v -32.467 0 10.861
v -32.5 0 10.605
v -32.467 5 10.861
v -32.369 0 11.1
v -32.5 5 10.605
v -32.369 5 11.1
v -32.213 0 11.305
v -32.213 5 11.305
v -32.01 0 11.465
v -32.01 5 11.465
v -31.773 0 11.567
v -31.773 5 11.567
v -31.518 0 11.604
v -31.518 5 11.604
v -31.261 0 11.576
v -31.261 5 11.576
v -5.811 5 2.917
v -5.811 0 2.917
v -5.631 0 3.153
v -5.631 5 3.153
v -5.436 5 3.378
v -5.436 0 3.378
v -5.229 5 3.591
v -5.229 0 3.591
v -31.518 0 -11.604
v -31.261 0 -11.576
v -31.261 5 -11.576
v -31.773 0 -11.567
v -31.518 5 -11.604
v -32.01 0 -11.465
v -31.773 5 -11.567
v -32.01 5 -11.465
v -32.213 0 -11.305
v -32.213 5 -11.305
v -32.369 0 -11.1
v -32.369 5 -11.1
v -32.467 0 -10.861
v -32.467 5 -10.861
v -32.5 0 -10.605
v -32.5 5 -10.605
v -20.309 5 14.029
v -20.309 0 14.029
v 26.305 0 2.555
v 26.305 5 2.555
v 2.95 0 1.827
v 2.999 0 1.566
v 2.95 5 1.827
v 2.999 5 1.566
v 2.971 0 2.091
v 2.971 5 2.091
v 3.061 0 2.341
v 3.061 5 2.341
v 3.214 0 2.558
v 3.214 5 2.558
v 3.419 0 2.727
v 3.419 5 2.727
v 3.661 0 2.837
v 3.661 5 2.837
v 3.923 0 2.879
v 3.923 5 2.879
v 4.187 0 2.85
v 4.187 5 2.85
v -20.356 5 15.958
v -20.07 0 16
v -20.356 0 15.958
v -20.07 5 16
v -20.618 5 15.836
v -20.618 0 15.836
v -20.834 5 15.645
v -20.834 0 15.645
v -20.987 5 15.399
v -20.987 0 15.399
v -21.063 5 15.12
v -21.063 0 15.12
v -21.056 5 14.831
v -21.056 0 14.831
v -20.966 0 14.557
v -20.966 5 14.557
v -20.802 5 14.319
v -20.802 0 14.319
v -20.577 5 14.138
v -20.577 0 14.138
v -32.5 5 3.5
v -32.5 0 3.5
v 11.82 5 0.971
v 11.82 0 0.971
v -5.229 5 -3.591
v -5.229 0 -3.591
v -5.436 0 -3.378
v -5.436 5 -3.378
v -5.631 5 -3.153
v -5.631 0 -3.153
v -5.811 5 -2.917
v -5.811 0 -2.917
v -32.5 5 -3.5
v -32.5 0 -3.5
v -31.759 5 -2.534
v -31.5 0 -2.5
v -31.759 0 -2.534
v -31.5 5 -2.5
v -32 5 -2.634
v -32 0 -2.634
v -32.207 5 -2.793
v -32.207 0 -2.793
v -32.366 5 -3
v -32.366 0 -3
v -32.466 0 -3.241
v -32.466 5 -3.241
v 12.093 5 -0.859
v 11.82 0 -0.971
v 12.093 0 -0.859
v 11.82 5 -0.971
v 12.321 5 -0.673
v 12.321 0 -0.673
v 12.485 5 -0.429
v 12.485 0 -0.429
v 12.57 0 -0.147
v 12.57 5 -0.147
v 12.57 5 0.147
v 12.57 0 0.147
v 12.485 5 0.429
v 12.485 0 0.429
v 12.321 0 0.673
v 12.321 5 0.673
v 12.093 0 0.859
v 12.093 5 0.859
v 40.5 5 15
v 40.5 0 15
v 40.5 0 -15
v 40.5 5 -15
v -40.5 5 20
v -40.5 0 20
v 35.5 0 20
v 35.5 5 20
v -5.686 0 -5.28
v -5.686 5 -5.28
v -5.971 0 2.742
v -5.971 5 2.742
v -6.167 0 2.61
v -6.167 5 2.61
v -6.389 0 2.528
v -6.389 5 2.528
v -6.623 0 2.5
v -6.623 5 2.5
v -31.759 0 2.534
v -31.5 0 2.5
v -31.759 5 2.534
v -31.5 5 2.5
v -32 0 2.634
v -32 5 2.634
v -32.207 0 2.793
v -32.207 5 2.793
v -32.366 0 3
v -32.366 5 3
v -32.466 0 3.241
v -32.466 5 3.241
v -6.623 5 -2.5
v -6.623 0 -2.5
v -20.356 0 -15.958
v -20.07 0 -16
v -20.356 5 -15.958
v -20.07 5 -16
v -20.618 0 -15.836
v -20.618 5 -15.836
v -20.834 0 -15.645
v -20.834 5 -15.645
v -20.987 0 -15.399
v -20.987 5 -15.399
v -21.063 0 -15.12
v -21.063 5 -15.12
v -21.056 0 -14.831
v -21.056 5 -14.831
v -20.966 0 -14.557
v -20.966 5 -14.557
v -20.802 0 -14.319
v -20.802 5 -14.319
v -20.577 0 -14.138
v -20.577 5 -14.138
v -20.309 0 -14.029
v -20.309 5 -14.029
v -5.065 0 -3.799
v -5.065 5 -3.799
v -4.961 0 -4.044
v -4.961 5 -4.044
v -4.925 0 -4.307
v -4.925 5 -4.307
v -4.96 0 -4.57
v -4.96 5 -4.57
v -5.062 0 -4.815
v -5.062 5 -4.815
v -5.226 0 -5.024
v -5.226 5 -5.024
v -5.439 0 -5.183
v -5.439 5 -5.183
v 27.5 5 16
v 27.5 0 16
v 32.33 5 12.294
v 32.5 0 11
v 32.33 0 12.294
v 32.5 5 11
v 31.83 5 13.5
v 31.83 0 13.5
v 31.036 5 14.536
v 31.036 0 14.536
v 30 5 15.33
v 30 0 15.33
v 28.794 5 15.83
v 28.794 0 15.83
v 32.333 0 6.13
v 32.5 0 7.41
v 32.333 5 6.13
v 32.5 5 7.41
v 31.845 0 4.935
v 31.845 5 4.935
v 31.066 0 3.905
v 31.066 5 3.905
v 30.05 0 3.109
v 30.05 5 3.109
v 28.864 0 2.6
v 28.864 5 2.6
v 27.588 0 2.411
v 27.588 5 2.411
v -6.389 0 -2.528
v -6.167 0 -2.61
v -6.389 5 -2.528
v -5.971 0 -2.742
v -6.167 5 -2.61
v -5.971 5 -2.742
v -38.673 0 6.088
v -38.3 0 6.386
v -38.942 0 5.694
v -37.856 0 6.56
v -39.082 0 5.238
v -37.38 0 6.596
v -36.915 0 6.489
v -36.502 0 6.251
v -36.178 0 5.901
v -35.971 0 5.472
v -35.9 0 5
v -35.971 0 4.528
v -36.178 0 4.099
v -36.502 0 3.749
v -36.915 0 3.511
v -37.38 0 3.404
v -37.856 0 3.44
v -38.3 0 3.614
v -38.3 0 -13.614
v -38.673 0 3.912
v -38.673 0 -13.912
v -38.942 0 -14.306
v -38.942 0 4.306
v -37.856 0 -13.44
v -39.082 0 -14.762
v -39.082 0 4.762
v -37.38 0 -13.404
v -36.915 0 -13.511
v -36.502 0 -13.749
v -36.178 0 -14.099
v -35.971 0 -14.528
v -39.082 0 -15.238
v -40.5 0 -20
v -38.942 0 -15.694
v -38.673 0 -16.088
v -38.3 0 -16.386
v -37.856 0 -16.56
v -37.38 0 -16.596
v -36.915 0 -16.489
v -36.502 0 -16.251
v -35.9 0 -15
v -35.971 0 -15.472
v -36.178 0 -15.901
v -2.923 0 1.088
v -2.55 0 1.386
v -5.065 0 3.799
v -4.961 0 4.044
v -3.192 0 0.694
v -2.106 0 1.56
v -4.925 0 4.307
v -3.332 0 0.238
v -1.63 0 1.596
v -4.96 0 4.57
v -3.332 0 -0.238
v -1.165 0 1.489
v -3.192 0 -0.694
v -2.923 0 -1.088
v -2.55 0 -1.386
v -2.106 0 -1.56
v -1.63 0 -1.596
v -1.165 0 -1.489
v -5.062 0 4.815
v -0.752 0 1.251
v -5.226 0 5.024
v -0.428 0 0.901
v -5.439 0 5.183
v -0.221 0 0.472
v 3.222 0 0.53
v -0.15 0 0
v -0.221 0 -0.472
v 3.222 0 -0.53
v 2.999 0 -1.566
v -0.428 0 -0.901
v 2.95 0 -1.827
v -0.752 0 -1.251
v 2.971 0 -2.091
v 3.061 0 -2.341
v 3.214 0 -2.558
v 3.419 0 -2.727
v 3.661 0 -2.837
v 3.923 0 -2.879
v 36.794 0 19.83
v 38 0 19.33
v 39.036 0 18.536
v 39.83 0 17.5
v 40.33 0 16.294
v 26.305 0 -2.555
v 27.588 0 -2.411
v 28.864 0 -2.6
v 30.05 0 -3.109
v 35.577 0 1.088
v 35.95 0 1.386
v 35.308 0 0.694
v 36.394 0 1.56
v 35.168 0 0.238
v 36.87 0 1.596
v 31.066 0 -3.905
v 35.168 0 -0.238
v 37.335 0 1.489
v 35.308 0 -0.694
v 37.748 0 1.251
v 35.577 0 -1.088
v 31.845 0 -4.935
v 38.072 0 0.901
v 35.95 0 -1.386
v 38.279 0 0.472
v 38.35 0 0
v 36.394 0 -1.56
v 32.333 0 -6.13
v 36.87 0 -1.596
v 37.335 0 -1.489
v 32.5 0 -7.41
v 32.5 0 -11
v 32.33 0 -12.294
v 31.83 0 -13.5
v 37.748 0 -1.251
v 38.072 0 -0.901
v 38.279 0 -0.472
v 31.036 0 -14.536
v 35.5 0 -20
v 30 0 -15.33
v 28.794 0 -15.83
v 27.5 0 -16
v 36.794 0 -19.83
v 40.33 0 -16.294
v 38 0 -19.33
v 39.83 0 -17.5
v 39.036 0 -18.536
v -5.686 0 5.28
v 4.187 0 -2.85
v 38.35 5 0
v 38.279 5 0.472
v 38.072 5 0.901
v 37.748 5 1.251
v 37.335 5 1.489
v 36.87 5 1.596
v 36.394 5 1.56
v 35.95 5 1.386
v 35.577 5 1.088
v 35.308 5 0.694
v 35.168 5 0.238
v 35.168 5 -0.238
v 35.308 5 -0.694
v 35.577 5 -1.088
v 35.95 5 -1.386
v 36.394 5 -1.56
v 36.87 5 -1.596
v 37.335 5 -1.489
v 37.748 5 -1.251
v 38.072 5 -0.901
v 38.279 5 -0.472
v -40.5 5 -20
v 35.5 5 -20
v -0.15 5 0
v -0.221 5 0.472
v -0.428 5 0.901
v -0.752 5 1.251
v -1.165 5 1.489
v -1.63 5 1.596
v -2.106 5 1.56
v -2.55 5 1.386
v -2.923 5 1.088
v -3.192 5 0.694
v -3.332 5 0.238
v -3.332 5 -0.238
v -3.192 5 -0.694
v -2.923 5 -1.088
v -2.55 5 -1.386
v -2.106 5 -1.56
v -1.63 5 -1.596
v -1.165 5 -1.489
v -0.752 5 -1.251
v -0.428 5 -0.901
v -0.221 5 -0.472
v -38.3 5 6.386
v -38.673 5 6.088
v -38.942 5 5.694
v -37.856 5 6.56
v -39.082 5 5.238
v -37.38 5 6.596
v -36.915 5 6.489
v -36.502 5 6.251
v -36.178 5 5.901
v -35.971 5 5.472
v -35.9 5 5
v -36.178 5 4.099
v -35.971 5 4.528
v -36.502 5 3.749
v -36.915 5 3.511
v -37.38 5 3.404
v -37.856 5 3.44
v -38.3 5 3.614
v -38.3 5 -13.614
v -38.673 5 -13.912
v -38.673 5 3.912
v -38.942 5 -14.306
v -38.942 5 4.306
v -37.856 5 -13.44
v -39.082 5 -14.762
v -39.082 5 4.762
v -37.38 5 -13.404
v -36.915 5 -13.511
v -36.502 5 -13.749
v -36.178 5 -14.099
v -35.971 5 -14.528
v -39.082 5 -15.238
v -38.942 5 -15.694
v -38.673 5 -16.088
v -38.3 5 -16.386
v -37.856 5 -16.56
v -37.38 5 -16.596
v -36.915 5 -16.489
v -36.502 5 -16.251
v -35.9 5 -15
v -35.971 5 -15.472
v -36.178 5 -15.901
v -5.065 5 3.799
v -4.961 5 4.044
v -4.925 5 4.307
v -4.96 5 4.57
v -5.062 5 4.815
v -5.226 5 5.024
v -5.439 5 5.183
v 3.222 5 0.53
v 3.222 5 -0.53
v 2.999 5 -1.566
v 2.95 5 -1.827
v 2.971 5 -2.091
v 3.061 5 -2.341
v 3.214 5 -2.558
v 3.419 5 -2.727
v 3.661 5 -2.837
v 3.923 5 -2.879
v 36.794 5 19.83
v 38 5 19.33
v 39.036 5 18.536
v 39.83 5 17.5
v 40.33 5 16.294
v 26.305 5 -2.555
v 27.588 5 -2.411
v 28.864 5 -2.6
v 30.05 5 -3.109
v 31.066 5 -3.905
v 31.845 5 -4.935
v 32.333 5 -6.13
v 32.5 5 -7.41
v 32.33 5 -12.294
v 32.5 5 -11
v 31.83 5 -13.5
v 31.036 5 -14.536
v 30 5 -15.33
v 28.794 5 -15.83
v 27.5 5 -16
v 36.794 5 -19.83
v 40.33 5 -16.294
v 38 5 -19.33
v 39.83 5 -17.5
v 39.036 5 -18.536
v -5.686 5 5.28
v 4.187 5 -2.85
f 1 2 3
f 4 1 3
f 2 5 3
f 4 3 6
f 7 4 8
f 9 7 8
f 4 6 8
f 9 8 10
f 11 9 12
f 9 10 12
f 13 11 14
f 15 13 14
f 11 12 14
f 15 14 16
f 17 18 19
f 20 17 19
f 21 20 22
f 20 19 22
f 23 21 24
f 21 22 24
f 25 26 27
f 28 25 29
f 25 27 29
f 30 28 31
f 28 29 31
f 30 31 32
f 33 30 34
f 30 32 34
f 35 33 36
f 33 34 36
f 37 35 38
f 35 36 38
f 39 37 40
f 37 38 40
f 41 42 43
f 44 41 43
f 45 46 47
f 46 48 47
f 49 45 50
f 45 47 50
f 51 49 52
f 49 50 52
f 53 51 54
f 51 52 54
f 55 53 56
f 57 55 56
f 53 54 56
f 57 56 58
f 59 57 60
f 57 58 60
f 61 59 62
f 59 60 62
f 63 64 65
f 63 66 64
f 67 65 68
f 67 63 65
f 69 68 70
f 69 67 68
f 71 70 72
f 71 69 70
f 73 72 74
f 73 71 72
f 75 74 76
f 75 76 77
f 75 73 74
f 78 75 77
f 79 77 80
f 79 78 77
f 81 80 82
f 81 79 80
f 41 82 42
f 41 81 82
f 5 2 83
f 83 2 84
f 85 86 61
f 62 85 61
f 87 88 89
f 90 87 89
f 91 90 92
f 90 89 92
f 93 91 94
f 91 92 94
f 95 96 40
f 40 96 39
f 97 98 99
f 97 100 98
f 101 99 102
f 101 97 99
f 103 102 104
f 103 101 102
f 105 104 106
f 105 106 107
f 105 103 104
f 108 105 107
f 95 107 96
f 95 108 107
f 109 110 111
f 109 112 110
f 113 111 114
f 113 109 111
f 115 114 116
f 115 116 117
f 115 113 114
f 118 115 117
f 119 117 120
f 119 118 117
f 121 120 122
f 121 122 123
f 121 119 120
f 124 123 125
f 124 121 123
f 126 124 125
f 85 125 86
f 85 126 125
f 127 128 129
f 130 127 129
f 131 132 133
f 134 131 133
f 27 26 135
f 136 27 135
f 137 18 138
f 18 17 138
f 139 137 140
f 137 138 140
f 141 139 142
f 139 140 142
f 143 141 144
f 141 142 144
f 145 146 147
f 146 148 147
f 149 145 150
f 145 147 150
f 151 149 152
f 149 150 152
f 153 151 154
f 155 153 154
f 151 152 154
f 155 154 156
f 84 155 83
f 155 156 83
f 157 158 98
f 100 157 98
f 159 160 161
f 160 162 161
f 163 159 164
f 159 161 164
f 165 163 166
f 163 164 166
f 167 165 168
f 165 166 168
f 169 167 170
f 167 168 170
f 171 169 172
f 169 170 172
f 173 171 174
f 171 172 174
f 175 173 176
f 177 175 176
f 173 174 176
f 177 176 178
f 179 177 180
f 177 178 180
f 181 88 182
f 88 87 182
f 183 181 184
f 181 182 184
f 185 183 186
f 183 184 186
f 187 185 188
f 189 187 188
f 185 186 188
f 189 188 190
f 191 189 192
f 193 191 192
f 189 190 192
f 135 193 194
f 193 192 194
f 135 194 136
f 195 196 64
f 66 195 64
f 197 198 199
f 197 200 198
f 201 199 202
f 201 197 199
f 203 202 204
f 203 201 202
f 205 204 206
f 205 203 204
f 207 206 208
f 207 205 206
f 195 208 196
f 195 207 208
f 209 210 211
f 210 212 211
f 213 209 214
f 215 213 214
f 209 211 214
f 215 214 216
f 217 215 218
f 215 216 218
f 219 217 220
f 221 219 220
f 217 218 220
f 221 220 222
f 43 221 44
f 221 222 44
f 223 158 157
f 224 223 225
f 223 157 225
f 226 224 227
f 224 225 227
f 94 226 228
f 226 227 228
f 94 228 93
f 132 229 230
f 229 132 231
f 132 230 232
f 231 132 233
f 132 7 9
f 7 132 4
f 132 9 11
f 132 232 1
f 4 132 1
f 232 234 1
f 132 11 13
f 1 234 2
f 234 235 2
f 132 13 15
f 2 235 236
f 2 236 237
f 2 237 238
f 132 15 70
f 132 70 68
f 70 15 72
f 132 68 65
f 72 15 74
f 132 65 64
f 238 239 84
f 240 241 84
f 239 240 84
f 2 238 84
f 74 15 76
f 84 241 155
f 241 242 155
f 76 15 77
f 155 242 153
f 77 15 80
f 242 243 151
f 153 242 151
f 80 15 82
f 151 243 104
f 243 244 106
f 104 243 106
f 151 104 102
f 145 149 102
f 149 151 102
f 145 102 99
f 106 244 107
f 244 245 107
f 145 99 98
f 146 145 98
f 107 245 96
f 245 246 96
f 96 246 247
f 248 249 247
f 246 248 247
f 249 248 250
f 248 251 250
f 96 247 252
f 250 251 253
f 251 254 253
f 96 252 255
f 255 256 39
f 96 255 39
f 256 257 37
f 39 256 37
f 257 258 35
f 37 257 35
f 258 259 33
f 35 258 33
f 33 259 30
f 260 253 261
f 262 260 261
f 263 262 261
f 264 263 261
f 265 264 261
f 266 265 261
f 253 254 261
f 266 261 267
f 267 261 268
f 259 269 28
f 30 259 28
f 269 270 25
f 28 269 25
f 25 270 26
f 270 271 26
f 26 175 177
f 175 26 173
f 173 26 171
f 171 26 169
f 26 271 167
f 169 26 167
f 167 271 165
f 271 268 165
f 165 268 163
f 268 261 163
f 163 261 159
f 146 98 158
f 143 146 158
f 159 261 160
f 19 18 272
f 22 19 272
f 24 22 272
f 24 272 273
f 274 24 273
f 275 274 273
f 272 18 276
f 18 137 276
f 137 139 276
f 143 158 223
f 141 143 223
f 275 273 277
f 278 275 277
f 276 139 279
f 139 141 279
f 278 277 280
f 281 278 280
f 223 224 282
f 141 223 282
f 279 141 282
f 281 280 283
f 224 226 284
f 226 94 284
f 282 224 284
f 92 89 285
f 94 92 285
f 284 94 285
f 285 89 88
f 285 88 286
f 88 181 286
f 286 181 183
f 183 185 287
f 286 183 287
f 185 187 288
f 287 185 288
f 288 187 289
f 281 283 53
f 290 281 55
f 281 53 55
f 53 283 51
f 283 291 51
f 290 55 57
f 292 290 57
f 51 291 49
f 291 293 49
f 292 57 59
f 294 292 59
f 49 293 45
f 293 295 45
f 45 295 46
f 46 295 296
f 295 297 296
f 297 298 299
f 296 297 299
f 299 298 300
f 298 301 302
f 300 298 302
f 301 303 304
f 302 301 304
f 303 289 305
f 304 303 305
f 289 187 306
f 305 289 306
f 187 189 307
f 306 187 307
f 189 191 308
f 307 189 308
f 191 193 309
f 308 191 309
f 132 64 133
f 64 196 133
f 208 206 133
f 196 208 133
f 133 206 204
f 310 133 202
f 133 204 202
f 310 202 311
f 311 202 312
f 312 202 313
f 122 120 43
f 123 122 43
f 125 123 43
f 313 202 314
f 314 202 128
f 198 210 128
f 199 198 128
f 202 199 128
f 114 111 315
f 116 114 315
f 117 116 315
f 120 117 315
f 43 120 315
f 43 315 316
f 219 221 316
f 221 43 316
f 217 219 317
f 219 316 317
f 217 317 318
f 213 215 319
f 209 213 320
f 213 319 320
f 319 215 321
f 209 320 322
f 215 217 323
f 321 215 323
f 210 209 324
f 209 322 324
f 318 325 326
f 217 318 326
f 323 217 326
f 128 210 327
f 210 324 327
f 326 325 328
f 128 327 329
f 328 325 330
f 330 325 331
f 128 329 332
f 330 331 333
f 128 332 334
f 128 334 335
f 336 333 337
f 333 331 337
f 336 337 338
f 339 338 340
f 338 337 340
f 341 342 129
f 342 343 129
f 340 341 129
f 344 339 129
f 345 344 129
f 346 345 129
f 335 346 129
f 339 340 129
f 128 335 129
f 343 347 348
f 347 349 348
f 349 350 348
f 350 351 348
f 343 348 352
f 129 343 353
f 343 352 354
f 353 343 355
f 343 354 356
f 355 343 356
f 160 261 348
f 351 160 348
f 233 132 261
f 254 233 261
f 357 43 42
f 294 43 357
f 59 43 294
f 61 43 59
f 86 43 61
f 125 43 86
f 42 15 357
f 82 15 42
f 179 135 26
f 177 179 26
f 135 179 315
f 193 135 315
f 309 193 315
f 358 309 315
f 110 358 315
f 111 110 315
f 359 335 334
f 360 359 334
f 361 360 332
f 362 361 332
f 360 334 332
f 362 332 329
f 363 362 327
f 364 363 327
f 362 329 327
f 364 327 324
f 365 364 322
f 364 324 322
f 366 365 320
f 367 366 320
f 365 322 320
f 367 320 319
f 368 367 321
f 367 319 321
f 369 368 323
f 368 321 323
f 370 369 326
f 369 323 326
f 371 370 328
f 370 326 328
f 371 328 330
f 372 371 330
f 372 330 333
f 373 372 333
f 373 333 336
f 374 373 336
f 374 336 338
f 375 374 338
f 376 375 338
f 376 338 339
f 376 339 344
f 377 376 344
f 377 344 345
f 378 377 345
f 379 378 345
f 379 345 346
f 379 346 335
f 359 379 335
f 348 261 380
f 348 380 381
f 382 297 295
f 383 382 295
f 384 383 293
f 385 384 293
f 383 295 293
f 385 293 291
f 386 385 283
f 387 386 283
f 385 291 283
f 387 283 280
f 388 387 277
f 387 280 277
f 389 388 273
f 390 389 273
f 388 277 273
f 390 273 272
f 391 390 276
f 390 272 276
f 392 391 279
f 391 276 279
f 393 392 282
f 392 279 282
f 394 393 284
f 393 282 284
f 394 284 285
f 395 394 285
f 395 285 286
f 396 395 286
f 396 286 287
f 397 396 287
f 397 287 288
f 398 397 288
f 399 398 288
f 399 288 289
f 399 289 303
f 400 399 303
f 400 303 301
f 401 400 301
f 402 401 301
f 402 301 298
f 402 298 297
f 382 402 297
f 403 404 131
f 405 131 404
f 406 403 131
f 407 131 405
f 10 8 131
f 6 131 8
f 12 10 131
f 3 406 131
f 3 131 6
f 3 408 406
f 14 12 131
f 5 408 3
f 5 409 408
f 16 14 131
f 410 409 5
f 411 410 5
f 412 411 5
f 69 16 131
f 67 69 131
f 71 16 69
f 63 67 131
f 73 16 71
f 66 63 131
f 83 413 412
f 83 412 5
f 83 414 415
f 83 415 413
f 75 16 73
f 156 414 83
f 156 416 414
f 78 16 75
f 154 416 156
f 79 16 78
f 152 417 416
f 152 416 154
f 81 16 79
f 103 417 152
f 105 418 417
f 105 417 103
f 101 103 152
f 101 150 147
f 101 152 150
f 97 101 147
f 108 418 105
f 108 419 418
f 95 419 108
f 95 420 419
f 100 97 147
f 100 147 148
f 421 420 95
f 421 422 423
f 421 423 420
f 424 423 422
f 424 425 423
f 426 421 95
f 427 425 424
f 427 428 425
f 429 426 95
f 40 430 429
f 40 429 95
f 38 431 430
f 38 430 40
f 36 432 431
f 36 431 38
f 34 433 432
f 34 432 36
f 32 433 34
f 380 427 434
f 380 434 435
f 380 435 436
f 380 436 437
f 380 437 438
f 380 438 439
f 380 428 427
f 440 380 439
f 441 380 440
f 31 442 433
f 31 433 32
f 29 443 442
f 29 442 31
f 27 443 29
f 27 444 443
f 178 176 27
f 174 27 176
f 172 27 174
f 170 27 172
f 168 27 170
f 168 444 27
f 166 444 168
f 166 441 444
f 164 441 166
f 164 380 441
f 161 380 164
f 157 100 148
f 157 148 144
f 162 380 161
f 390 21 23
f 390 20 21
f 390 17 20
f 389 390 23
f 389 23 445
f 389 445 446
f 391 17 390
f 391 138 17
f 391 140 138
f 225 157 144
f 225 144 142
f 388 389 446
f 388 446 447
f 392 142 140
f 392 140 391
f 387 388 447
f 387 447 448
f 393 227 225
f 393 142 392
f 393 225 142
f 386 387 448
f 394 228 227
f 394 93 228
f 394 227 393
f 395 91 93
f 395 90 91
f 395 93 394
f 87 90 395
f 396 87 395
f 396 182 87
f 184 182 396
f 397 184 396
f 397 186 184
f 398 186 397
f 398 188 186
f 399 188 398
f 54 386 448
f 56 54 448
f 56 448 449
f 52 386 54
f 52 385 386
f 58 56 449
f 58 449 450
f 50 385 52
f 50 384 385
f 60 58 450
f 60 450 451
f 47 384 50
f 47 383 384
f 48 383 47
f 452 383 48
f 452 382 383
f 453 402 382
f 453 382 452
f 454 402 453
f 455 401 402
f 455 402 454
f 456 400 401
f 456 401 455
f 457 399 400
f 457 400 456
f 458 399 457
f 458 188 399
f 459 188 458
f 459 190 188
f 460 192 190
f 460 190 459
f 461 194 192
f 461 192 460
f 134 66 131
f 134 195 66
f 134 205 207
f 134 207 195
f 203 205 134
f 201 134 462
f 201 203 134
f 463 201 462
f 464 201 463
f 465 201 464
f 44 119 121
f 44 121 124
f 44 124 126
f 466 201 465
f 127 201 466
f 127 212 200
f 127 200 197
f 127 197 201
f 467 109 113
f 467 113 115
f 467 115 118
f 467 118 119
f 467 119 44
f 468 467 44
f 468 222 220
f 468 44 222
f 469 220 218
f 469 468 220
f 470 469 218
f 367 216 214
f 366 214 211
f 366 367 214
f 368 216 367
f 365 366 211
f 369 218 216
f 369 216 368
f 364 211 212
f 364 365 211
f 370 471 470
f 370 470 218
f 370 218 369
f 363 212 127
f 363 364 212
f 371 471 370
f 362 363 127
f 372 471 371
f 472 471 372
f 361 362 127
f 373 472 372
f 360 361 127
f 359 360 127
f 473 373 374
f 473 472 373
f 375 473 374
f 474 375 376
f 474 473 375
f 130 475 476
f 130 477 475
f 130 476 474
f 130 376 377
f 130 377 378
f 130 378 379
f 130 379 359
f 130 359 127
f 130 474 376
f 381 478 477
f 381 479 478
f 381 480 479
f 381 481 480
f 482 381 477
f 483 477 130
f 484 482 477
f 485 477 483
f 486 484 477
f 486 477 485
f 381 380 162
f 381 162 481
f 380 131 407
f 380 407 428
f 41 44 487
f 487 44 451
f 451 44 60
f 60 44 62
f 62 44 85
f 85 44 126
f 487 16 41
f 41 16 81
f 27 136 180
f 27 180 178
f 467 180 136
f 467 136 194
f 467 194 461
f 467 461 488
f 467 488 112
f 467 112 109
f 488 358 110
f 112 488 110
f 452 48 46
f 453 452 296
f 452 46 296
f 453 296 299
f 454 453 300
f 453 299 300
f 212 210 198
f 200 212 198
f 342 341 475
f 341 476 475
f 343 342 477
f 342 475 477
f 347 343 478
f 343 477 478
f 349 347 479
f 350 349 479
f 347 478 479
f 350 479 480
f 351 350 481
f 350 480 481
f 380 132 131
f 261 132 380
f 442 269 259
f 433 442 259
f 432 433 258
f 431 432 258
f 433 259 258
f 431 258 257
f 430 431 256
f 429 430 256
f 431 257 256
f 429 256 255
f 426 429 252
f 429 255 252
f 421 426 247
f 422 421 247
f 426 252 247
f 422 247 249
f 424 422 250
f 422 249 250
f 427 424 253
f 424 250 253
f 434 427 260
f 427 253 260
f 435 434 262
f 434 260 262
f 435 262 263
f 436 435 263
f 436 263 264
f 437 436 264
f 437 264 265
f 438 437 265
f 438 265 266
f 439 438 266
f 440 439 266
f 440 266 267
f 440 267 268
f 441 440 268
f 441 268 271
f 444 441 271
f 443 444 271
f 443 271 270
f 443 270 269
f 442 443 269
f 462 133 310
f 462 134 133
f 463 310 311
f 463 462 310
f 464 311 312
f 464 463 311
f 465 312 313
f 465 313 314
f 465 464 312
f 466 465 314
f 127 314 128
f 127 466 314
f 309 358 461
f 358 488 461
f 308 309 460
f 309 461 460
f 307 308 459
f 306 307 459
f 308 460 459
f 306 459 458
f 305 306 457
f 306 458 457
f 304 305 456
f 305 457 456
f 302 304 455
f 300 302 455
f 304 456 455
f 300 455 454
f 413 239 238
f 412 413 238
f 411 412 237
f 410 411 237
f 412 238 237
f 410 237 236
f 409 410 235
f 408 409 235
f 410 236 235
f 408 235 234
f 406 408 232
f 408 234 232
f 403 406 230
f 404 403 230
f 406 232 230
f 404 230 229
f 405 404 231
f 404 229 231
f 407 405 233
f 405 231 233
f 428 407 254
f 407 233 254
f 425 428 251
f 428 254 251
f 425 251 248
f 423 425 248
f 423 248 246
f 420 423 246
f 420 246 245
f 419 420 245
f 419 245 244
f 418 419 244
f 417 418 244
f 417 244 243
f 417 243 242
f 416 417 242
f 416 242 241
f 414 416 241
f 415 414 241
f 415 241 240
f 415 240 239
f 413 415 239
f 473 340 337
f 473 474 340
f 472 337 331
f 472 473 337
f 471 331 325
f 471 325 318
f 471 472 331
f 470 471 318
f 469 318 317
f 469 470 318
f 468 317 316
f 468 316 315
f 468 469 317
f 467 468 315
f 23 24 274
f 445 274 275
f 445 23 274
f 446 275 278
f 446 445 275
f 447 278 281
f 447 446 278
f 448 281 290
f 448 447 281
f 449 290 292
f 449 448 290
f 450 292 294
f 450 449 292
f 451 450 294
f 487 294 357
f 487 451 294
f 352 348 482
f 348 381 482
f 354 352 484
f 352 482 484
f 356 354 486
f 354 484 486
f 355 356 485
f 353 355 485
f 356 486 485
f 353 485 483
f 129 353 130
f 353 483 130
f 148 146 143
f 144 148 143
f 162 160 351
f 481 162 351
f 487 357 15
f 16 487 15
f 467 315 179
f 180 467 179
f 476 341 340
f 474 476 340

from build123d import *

# Parameters (mm, degrees)
SKETCH_1_W          = 81
SKETCH_1_H          = 40
EXTRUDE_1_DEPTH     = 5
SKETCH_2_R          = 1.6
CUT_EXTRUDE_1_DEPTH = 6
FILLET_1_R          = 5
SKETCH_3_R          = 1.6
CUT_EXTRUDE_2_DEPTH = 6
CUT_EXTRUDE_5_DEPTH = 10
FILLET_2_R          = 5
FILLET_3_R          = 5
FILLET_4_R          = 1
FILLET_5_R          = 1


with BuildPart() as part:
    # 草图1 → 凸台-拉伸1 (new body)
    with BuildSketch(Plane(origin=(0, 0, 0), x_dir=(1, 0, 0), z_dir=(0, 1, 0))):
        Rectangle(SKETCH_1_W, SKETCH_1_H)
    extrude(amount=EXTRUDE_1_DEPTH)

    # 草图2 → 切除-拉伸1 (cut, through all)
    with BuildSketch(Plane.XZ):
        with Locations((36.75, 0)):
            Circle(SKETCH_2_R)
        with Locations((-1.75, 0)):
            Circle(SKETCH_2_R)
    extrude(amount=-CUT_EXTRUDE_1_DEPTH, mode=Mode.SUBTRACT)

    # 圆角1
    fillet_1_edges = [part.edges().sort_by_distance(p)[0] for p in [
        (40.5, 2.5, 20),
        (40.5, 2.5, -20),
    ]]
    fillet(fillet_1_edges, radius=FILLET_1_R)

    # 草图3 → 切除-拉伸2 (cut, through all)
    with BuildSketch(Plane.XZ):
        with Locations((-37.5, 5)):
            Circle(SKETCH_3_R)
        with Locations((-37.5, -15)):
            Circle(SKETCH_3_R)
    extrude(amount=-CUT_EXTRUDE_2_DEPTH, mode=Mode.SUBTRACT)

    # 草图4 → 切除-拉伸5 (cut)
    with BuildSketch(Plane.XZ):
        Polygon((32.5, 16), (-28.316233007, 16), (32.5, 1.029850337), align=None)
        with BuildLine():
            Line((-3.40399678, 4.718505553), (-32.5, 11.880598653))
            Line((-32.5, 11.880598653), (-32.5, 2.5))
            Line((-32.5, 2.5), (-6.080127019, 2.5))
            ThreePointArc((-6.080127019, 2.5), (-4.941061913, 3.849301738), (-3.40399678, 4.718505553))
        make_face()
        Polygon((32.5, -1.029850337), (-28.316233007, -16), (32.5, -16), align=None)
        with BuildLine():
            Line((15.764932029, 0), (1.905256588, 3.411612416))
            ThreePointArc((1.905256588, 3.411612416), (3.25, 0), (1.905256588, -3.411612416))
            Line((1.905256588, -3.411612416), (15.764932029, 0))
        make_face()
        with BuildLine():
            Line((-32.5, -2.5), (-32.5, -11.880598653))
            Line((-32.5, -11.880598653), (-3.40399678, -4.718505553))
            ThreePointArc((-3.40399678, -4.718505553), (-4.941061913, -3.849301738), (-6.080127019, -2.5))
            Line((-6.080127019, -2.5), (-32.5, -2.5))
        make_face()
    extrude(amount=-CUT_EXTRUDE_5_DEPTH, mode=Mode.SUBTRACT)

    # 圆角2
    fillet_2_edges = [part.edges().sort_by_distance(p)[0] for p in [
        (32.5, 2.5, 1.029850337),
        (32.5, 2.5, -1.029850337),
    ]]
    fillet(fillet_2_edges, radius=FILLET_2_R)

    # 圆角3
    fillet_3_edges = [part.edges().sort_by_distance(p)[0] for p in [
        (32.5, 2.5, 16),
        (32.5, 2.5, -16),
    ]]
    fillet(fillet_3_edges, radius=FILLET_3_R)

    # 圆角4
    fillet_4_edges = [part.edges().sort_by_distance(p)[0] for p in [
        (1.905256588, 2.5, -3.411612416),
        (1.905256588, 2.5, 3.411612416),
        (15.764932029, 2.5, 0),
    ]]
    fillet(fillet_4_edges, radius=FILLET_4_R)

    # 圆角5
    fillet_5_edges = [part.edges().sort_by_distance(p)[0] for p in [
        (-6.080127019, 2.5, -2.5),
        (-3.40399678, 2.5, -4.718505553),
        (-32.5, 2.5, -11.880598653),
        (-32.5, 2.5, -2.5),
        (-28.316233007, 2.5, 16),
        (-28.316233007, 2.5, -16),
        (-3.40399678, 2.5, 4.718505553),
        (-6.080127019, 2.5, 2.5),
        (-32.5, 2.5, 2.5),
        (-32.5, 2.5, 11.880598653),
    ]]
    fillet(fillet_5_edges, radius=FILLET_5_R)


solid = part.part
